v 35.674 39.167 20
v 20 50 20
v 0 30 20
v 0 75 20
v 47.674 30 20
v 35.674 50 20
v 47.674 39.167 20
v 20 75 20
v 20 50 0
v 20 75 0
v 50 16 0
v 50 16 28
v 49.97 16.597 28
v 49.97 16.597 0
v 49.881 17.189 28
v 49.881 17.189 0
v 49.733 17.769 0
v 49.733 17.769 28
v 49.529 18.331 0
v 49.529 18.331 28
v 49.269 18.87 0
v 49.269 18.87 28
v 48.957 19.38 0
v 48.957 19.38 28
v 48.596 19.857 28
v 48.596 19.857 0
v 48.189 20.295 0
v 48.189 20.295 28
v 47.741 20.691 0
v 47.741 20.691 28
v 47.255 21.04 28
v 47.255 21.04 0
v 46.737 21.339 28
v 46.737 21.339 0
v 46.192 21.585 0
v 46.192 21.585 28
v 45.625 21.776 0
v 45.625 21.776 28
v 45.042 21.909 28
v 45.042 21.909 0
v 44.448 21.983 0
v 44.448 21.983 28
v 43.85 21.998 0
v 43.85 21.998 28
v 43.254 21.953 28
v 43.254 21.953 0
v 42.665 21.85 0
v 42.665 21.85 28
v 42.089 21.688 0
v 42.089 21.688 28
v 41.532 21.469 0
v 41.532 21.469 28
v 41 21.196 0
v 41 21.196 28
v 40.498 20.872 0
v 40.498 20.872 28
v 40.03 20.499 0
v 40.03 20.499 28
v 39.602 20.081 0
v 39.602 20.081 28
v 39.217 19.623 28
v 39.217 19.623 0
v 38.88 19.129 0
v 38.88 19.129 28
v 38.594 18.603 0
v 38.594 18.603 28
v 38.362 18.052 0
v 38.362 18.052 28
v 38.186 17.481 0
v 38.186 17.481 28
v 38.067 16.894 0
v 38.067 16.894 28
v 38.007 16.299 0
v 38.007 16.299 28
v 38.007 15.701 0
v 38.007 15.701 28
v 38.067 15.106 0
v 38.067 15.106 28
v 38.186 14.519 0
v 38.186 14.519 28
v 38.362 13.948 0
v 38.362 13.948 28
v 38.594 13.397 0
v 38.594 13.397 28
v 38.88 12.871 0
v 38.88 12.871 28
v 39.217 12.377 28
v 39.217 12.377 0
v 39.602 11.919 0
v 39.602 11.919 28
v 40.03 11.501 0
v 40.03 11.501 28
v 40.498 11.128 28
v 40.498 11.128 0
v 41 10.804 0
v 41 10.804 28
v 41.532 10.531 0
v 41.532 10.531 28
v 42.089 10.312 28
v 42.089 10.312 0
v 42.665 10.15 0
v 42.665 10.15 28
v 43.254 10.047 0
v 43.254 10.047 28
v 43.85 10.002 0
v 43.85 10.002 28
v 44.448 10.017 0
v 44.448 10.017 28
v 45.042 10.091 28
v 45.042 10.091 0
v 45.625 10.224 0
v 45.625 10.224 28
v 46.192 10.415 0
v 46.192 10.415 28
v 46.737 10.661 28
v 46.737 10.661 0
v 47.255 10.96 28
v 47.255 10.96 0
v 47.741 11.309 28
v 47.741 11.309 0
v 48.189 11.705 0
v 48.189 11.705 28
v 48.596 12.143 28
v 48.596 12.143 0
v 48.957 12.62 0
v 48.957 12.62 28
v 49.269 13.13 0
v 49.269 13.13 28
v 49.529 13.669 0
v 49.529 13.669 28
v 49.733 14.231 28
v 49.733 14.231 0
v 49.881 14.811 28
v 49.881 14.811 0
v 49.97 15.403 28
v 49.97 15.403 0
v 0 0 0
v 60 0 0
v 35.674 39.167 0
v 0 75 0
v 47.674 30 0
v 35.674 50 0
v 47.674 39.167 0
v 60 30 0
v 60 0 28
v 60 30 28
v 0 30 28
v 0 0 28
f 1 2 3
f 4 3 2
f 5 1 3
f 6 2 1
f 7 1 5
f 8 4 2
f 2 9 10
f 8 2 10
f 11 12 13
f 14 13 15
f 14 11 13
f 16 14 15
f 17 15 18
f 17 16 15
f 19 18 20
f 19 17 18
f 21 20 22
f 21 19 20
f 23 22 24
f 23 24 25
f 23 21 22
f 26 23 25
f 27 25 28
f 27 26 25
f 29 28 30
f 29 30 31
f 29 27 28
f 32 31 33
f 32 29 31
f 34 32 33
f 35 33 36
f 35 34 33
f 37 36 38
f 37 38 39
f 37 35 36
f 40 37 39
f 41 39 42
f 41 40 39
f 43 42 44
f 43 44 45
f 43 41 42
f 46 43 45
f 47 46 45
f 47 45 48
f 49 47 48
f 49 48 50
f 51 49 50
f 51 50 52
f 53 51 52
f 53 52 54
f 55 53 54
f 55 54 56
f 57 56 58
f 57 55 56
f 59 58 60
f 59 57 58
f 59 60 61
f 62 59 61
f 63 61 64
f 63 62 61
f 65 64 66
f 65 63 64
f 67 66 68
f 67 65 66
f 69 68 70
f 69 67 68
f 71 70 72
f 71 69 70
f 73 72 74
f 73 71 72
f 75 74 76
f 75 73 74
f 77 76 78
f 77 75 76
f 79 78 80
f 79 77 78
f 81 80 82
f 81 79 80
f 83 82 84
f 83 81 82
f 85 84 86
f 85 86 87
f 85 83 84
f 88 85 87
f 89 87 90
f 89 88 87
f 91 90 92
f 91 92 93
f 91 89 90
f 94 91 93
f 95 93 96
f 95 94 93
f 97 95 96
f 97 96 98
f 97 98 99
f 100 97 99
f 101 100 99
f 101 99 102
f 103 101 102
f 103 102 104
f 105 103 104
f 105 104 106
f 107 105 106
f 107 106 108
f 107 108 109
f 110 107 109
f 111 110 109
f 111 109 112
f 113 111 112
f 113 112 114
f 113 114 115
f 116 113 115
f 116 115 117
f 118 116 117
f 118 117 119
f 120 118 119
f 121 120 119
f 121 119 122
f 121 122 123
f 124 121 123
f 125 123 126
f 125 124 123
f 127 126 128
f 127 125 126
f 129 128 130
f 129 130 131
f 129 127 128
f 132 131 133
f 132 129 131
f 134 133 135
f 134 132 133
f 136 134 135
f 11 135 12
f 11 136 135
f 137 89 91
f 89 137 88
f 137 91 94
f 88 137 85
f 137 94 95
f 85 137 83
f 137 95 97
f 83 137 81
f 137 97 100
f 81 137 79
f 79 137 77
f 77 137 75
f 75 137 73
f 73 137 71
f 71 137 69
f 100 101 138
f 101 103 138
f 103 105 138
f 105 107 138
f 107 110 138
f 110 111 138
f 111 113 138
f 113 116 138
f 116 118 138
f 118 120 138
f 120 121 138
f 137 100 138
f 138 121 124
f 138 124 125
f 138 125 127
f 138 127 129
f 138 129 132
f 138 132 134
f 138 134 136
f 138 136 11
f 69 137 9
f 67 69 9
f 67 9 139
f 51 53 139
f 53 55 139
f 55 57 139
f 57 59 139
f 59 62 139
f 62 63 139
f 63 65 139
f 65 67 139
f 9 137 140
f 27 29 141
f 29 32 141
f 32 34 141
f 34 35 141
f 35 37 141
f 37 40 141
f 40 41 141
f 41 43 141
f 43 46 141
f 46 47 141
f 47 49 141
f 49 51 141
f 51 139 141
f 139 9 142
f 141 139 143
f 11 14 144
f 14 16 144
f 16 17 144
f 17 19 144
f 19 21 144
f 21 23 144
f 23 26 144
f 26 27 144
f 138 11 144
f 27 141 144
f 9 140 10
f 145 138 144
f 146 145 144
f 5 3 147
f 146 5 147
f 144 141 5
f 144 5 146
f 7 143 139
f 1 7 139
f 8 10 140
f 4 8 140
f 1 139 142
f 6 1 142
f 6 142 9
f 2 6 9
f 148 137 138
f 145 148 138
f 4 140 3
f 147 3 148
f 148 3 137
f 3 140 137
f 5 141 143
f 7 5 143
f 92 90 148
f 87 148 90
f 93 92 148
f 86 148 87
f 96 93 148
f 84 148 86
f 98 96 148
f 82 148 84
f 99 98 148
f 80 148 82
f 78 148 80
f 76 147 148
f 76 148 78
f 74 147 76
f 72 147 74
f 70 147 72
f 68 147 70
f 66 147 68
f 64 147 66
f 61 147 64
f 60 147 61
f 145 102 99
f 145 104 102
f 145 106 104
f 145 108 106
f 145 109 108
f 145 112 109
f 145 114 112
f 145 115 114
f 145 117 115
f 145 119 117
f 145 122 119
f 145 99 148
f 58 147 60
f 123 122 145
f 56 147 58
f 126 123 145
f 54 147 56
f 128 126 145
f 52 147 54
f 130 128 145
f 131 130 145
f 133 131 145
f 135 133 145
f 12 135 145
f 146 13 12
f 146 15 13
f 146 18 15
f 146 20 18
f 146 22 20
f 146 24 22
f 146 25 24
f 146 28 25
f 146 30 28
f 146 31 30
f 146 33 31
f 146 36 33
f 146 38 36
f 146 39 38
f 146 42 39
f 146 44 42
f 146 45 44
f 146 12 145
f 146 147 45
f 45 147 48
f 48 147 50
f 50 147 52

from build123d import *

# Parameters (mm, degrees)
SKETCH2_R           = 6
BOSS_EXTRUDE1_DEPTH = 28
BOSS_EXTRUDE2_DEPTH = 20


with BuildPart() as part:
    # Sketch2 → Boss-Extrude1 (new body)
    with BuildSketch(Plane.XY):
        Polygon((60, 30), (47.673729326, 30), (0, 30), (0, 0), (60, 0), align=None)
        with Locations((44, 16)):
            Circle(SKETCH2_R, mode=Mode.SUBTRACT)
    extrude(amount=BOSS_EXTRUDE1_DEPTH)

    # Sketch2<3> → Boss-Extrude2 (add)
    with BuildSketch(Plane.XY):
        Polygon((35.673729326, 39.1665834), (35.673729326, 50), (20, 50), (20, 75), (0, 75), (0, 50), (0, 30), (47.673729326, 30), (47.673729326, 39.1665834), align=None)
    extrude(amount=BOSS_EXTRUDE2_DEPTH)


solid = part.part
